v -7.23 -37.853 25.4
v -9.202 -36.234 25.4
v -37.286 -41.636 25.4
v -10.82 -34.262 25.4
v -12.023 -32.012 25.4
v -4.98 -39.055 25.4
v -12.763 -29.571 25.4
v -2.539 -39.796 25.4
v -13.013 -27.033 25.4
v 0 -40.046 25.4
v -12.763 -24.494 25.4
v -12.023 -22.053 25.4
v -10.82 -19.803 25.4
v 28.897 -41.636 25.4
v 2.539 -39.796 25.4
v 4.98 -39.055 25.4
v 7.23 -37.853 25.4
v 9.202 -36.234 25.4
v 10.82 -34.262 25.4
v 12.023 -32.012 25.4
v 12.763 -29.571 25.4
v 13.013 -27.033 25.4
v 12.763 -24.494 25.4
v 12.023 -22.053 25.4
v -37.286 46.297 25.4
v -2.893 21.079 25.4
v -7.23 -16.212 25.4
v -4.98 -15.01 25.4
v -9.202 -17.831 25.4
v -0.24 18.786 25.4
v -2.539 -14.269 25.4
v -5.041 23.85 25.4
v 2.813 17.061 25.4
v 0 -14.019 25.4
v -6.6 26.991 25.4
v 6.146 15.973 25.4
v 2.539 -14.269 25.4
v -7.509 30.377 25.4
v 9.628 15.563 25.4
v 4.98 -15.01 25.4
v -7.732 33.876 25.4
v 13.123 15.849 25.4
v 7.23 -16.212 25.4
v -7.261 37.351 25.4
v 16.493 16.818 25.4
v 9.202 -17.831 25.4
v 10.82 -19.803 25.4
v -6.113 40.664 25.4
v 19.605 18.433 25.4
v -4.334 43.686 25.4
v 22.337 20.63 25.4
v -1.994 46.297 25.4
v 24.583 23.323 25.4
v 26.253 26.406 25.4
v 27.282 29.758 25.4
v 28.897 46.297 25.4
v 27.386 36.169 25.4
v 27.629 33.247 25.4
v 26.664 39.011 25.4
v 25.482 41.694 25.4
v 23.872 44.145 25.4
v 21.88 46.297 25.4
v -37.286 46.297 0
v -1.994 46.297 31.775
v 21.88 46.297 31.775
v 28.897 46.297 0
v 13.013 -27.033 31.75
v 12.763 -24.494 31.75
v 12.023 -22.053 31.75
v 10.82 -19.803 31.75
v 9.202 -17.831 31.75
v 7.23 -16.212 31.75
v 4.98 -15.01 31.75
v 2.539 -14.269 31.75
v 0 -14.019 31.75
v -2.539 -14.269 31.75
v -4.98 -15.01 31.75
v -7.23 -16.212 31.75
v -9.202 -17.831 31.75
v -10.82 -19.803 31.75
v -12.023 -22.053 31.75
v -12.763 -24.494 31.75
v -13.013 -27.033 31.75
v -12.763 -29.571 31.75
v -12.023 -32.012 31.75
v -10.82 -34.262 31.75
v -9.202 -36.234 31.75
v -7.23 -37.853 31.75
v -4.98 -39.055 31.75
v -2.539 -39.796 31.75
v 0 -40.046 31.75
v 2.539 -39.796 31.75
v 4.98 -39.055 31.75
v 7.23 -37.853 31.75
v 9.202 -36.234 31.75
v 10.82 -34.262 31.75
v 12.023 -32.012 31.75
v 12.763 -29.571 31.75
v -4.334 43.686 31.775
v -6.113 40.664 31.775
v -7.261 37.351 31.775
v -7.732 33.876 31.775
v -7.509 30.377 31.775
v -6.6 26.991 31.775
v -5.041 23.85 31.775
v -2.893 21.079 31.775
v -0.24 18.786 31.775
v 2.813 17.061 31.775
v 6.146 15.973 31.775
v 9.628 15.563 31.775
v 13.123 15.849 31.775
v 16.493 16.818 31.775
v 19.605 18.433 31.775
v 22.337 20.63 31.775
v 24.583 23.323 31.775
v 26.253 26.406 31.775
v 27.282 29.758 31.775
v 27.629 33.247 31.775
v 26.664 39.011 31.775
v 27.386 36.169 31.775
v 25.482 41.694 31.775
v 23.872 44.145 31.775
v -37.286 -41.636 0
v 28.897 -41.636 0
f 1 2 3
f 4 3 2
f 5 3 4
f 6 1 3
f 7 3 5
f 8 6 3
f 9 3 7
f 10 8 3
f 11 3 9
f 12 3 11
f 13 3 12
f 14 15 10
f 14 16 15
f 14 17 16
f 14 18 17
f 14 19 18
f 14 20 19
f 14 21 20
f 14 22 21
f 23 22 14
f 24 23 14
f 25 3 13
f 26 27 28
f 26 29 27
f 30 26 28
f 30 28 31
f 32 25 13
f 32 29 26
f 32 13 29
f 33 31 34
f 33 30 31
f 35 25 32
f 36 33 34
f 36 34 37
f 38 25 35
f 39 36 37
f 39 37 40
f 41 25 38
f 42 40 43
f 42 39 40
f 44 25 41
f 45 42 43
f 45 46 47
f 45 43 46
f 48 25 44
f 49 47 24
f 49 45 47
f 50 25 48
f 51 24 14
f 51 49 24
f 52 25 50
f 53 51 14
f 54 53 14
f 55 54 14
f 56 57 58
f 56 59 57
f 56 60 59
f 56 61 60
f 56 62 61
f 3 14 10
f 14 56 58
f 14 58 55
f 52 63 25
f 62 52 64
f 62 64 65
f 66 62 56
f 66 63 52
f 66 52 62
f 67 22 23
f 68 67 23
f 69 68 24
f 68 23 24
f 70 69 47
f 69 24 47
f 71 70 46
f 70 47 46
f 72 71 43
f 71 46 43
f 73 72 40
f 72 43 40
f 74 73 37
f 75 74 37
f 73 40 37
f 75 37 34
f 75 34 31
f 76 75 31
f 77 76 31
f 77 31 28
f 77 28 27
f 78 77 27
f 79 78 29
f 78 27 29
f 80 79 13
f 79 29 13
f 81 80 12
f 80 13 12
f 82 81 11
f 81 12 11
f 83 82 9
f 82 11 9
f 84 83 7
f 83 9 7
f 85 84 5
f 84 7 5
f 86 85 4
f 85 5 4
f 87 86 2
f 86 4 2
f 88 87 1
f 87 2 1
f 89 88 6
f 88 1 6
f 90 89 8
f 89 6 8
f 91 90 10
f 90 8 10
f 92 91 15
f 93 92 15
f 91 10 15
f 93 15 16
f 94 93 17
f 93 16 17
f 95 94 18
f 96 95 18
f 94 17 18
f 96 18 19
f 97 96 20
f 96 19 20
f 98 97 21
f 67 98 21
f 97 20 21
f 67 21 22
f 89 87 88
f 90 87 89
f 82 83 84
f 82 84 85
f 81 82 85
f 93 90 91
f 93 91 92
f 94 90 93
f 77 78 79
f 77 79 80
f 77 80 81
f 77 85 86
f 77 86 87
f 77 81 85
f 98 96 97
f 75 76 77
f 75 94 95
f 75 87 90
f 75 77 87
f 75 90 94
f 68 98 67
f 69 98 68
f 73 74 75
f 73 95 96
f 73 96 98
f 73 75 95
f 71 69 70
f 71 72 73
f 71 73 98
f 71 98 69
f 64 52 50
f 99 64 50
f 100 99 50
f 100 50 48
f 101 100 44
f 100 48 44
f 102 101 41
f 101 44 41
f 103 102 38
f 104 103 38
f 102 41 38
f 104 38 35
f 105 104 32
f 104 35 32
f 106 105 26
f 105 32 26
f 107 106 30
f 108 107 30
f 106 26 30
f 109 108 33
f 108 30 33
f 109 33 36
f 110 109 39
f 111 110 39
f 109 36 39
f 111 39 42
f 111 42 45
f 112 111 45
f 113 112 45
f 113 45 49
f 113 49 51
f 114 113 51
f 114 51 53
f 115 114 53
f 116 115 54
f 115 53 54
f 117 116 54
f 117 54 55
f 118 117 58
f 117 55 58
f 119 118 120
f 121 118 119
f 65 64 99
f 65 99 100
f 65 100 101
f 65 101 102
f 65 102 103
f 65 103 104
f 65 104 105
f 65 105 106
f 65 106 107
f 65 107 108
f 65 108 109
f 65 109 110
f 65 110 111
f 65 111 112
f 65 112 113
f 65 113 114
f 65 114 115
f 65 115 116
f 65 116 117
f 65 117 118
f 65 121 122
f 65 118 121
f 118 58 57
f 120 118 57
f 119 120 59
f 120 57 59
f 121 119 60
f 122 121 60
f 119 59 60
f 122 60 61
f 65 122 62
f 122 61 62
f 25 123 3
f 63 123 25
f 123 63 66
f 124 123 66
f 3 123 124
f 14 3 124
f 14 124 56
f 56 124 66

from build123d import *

# Parameters (mm, degrees)
F0_W     = 66.183033
F0_H     = 87.93332
F1_DEPTH = 25.4
F2_R     = 13.013131
F3_DEPTH = 6.35
F4_DEPTH = 6.3754


with BuildPart() as f1:
    # F0 (on Top) → F1 (new body)
    with BuildSketch(Plane.XY):
        with Locations((-4.194698, 2.330387)):
            Rectangle(F0_W, F0_H)
    extrude(amount=F1_DEPTH)

    # F2 (on face) → F3 (join)
    with BuildSketch(Plane.XY.offset(25.4)):
        with Locations((0, -27.032504)):
            Circle(F2_R)
    extrude(amount=F3_DEPTH)

    # F2 (on face) → F4 (join)
    with BuildSketch(Plane.XY.offset(25.4)):
        with BuildLine():
            ThreePointArc((-1.99442, 46.297047), (2.81281, 17.061409), (27.629392, 33.246875))
            ThreePointArc((27.629392, 33.246875), (26.128457, 40.377055), (21.880402, 46.297047))
            Line((21.880402, 46.297047), (-1.99442, 46.297047))
        make_face()
    extrude(amount=F4_DEPTH)


solid = f1.part
